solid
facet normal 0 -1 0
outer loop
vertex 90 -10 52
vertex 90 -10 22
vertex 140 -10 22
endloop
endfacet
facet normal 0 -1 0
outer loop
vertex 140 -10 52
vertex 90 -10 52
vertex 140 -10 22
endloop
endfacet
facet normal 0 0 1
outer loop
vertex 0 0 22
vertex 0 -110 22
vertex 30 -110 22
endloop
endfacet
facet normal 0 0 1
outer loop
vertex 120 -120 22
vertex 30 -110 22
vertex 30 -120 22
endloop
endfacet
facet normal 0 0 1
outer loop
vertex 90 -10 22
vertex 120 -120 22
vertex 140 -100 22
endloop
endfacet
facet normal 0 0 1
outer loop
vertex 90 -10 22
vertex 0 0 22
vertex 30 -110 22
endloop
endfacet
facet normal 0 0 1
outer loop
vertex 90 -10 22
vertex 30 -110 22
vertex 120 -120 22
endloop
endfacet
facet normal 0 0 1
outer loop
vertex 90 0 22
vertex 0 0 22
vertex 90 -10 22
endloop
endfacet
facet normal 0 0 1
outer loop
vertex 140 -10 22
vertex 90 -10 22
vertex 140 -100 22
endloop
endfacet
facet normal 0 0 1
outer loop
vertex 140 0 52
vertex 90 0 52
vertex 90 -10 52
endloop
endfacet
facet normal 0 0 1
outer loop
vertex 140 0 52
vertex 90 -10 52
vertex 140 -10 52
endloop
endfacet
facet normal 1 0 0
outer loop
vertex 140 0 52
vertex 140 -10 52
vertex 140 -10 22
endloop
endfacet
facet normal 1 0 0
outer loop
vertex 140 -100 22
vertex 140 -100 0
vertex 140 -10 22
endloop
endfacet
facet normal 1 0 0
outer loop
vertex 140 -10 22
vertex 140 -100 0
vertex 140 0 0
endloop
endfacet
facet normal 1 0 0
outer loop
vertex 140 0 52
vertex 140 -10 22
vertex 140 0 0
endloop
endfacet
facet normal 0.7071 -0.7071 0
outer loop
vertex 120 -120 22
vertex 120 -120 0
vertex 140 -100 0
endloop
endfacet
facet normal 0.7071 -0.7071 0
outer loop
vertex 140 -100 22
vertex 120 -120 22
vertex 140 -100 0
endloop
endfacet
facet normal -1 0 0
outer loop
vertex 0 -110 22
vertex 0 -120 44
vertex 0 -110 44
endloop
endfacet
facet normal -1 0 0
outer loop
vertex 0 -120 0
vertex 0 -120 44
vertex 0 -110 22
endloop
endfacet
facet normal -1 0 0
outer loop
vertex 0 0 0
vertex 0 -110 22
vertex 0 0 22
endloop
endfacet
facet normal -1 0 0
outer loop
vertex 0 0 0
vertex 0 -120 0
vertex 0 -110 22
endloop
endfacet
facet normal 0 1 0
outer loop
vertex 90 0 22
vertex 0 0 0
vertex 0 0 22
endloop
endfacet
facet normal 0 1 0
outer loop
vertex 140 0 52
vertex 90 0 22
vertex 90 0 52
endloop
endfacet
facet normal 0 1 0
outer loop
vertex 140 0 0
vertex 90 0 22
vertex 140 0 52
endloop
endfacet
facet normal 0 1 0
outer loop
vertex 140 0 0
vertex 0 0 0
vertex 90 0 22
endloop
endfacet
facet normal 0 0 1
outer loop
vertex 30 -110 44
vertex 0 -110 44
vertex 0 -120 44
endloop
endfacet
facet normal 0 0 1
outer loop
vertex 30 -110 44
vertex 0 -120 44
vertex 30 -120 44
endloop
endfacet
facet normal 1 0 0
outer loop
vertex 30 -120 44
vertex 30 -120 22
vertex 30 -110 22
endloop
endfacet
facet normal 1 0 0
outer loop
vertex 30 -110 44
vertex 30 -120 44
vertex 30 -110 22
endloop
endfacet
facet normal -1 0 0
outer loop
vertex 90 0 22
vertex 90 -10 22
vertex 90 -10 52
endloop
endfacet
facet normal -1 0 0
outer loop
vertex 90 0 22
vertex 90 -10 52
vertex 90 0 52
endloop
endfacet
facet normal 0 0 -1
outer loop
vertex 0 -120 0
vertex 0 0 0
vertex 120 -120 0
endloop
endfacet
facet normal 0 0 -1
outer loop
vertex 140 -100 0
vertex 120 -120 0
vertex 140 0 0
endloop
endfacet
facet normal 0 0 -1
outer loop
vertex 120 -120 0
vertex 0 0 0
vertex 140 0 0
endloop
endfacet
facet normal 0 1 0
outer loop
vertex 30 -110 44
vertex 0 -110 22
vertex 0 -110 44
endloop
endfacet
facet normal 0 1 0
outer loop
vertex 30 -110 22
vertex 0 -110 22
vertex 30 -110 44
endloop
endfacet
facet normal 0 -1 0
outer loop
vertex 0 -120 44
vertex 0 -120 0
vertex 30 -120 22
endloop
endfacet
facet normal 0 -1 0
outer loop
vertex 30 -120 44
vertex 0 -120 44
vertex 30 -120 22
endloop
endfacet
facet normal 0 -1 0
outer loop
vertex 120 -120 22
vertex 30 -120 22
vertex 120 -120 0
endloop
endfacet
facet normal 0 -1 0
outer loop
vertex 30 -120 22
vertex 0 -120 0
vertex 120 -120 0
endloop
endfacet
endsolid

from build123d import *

# Parameters (mm, degrees)
BOSS_EXTRUDE1_DEPTH = 22
SKETCH1_3_W         = 30
SKETCH1_3_H         = 10
BOSS_EXTRUDE2_DEPTH = 44
SKETCH1_4_W         = 30
SKETCH1_4_H         = 10
BOSS_EXTRUDE3_DEPTH = 52
SKETCH1_5_W         = 20
SKETCH1_5_H         = 10
BOSS_EXTRUDE4_DEPTH = 52


with BuildPart() as part:
    # Sketch1 → Boss-Extrude1 (new body)
    with BuildSketch(Plane.XY):
        Polygon((90, 0), (0, 0), (0, -110), (30, -110), (30, -120), (120, -120), (140, -100), (140, -10), (110, -10), (90, -10), align=None)
    extrude(amount=BOSS_EXTRUDE1_DEPTH)

    # Sketch1<3> → Boss-Extrude2 (add)
    with BuildSketch(Plane.XY):
        with Locations((15, -115)):
            Rectangle(SKETCH1_3_W, SKETCH1_3_H)
    extrude(amount=BOSS_EXTRUDE2_DEPTH)

    # Sketch1<4> → Boss-Extrude3 (add)
    with BuildSketch(Plane.XY):
        with Locations((125, -5)):
            Rectangle(SKETCH1_4_W, SKETCH1_4_H)
    extrude(amount=BOSS_EXTRUDE3_DEPTH)

    # Sketch1<5> → Boss-Extrude4 (add)
    with BuildSketch(Plane.XY):
        with Locations((100, -5)):
            Rectangle(SKETCH1_5_W, SKETCH1_5_H)
    extrude(amount=BOSS_EXTRUDE4_DEPTH)


solid = part.part
